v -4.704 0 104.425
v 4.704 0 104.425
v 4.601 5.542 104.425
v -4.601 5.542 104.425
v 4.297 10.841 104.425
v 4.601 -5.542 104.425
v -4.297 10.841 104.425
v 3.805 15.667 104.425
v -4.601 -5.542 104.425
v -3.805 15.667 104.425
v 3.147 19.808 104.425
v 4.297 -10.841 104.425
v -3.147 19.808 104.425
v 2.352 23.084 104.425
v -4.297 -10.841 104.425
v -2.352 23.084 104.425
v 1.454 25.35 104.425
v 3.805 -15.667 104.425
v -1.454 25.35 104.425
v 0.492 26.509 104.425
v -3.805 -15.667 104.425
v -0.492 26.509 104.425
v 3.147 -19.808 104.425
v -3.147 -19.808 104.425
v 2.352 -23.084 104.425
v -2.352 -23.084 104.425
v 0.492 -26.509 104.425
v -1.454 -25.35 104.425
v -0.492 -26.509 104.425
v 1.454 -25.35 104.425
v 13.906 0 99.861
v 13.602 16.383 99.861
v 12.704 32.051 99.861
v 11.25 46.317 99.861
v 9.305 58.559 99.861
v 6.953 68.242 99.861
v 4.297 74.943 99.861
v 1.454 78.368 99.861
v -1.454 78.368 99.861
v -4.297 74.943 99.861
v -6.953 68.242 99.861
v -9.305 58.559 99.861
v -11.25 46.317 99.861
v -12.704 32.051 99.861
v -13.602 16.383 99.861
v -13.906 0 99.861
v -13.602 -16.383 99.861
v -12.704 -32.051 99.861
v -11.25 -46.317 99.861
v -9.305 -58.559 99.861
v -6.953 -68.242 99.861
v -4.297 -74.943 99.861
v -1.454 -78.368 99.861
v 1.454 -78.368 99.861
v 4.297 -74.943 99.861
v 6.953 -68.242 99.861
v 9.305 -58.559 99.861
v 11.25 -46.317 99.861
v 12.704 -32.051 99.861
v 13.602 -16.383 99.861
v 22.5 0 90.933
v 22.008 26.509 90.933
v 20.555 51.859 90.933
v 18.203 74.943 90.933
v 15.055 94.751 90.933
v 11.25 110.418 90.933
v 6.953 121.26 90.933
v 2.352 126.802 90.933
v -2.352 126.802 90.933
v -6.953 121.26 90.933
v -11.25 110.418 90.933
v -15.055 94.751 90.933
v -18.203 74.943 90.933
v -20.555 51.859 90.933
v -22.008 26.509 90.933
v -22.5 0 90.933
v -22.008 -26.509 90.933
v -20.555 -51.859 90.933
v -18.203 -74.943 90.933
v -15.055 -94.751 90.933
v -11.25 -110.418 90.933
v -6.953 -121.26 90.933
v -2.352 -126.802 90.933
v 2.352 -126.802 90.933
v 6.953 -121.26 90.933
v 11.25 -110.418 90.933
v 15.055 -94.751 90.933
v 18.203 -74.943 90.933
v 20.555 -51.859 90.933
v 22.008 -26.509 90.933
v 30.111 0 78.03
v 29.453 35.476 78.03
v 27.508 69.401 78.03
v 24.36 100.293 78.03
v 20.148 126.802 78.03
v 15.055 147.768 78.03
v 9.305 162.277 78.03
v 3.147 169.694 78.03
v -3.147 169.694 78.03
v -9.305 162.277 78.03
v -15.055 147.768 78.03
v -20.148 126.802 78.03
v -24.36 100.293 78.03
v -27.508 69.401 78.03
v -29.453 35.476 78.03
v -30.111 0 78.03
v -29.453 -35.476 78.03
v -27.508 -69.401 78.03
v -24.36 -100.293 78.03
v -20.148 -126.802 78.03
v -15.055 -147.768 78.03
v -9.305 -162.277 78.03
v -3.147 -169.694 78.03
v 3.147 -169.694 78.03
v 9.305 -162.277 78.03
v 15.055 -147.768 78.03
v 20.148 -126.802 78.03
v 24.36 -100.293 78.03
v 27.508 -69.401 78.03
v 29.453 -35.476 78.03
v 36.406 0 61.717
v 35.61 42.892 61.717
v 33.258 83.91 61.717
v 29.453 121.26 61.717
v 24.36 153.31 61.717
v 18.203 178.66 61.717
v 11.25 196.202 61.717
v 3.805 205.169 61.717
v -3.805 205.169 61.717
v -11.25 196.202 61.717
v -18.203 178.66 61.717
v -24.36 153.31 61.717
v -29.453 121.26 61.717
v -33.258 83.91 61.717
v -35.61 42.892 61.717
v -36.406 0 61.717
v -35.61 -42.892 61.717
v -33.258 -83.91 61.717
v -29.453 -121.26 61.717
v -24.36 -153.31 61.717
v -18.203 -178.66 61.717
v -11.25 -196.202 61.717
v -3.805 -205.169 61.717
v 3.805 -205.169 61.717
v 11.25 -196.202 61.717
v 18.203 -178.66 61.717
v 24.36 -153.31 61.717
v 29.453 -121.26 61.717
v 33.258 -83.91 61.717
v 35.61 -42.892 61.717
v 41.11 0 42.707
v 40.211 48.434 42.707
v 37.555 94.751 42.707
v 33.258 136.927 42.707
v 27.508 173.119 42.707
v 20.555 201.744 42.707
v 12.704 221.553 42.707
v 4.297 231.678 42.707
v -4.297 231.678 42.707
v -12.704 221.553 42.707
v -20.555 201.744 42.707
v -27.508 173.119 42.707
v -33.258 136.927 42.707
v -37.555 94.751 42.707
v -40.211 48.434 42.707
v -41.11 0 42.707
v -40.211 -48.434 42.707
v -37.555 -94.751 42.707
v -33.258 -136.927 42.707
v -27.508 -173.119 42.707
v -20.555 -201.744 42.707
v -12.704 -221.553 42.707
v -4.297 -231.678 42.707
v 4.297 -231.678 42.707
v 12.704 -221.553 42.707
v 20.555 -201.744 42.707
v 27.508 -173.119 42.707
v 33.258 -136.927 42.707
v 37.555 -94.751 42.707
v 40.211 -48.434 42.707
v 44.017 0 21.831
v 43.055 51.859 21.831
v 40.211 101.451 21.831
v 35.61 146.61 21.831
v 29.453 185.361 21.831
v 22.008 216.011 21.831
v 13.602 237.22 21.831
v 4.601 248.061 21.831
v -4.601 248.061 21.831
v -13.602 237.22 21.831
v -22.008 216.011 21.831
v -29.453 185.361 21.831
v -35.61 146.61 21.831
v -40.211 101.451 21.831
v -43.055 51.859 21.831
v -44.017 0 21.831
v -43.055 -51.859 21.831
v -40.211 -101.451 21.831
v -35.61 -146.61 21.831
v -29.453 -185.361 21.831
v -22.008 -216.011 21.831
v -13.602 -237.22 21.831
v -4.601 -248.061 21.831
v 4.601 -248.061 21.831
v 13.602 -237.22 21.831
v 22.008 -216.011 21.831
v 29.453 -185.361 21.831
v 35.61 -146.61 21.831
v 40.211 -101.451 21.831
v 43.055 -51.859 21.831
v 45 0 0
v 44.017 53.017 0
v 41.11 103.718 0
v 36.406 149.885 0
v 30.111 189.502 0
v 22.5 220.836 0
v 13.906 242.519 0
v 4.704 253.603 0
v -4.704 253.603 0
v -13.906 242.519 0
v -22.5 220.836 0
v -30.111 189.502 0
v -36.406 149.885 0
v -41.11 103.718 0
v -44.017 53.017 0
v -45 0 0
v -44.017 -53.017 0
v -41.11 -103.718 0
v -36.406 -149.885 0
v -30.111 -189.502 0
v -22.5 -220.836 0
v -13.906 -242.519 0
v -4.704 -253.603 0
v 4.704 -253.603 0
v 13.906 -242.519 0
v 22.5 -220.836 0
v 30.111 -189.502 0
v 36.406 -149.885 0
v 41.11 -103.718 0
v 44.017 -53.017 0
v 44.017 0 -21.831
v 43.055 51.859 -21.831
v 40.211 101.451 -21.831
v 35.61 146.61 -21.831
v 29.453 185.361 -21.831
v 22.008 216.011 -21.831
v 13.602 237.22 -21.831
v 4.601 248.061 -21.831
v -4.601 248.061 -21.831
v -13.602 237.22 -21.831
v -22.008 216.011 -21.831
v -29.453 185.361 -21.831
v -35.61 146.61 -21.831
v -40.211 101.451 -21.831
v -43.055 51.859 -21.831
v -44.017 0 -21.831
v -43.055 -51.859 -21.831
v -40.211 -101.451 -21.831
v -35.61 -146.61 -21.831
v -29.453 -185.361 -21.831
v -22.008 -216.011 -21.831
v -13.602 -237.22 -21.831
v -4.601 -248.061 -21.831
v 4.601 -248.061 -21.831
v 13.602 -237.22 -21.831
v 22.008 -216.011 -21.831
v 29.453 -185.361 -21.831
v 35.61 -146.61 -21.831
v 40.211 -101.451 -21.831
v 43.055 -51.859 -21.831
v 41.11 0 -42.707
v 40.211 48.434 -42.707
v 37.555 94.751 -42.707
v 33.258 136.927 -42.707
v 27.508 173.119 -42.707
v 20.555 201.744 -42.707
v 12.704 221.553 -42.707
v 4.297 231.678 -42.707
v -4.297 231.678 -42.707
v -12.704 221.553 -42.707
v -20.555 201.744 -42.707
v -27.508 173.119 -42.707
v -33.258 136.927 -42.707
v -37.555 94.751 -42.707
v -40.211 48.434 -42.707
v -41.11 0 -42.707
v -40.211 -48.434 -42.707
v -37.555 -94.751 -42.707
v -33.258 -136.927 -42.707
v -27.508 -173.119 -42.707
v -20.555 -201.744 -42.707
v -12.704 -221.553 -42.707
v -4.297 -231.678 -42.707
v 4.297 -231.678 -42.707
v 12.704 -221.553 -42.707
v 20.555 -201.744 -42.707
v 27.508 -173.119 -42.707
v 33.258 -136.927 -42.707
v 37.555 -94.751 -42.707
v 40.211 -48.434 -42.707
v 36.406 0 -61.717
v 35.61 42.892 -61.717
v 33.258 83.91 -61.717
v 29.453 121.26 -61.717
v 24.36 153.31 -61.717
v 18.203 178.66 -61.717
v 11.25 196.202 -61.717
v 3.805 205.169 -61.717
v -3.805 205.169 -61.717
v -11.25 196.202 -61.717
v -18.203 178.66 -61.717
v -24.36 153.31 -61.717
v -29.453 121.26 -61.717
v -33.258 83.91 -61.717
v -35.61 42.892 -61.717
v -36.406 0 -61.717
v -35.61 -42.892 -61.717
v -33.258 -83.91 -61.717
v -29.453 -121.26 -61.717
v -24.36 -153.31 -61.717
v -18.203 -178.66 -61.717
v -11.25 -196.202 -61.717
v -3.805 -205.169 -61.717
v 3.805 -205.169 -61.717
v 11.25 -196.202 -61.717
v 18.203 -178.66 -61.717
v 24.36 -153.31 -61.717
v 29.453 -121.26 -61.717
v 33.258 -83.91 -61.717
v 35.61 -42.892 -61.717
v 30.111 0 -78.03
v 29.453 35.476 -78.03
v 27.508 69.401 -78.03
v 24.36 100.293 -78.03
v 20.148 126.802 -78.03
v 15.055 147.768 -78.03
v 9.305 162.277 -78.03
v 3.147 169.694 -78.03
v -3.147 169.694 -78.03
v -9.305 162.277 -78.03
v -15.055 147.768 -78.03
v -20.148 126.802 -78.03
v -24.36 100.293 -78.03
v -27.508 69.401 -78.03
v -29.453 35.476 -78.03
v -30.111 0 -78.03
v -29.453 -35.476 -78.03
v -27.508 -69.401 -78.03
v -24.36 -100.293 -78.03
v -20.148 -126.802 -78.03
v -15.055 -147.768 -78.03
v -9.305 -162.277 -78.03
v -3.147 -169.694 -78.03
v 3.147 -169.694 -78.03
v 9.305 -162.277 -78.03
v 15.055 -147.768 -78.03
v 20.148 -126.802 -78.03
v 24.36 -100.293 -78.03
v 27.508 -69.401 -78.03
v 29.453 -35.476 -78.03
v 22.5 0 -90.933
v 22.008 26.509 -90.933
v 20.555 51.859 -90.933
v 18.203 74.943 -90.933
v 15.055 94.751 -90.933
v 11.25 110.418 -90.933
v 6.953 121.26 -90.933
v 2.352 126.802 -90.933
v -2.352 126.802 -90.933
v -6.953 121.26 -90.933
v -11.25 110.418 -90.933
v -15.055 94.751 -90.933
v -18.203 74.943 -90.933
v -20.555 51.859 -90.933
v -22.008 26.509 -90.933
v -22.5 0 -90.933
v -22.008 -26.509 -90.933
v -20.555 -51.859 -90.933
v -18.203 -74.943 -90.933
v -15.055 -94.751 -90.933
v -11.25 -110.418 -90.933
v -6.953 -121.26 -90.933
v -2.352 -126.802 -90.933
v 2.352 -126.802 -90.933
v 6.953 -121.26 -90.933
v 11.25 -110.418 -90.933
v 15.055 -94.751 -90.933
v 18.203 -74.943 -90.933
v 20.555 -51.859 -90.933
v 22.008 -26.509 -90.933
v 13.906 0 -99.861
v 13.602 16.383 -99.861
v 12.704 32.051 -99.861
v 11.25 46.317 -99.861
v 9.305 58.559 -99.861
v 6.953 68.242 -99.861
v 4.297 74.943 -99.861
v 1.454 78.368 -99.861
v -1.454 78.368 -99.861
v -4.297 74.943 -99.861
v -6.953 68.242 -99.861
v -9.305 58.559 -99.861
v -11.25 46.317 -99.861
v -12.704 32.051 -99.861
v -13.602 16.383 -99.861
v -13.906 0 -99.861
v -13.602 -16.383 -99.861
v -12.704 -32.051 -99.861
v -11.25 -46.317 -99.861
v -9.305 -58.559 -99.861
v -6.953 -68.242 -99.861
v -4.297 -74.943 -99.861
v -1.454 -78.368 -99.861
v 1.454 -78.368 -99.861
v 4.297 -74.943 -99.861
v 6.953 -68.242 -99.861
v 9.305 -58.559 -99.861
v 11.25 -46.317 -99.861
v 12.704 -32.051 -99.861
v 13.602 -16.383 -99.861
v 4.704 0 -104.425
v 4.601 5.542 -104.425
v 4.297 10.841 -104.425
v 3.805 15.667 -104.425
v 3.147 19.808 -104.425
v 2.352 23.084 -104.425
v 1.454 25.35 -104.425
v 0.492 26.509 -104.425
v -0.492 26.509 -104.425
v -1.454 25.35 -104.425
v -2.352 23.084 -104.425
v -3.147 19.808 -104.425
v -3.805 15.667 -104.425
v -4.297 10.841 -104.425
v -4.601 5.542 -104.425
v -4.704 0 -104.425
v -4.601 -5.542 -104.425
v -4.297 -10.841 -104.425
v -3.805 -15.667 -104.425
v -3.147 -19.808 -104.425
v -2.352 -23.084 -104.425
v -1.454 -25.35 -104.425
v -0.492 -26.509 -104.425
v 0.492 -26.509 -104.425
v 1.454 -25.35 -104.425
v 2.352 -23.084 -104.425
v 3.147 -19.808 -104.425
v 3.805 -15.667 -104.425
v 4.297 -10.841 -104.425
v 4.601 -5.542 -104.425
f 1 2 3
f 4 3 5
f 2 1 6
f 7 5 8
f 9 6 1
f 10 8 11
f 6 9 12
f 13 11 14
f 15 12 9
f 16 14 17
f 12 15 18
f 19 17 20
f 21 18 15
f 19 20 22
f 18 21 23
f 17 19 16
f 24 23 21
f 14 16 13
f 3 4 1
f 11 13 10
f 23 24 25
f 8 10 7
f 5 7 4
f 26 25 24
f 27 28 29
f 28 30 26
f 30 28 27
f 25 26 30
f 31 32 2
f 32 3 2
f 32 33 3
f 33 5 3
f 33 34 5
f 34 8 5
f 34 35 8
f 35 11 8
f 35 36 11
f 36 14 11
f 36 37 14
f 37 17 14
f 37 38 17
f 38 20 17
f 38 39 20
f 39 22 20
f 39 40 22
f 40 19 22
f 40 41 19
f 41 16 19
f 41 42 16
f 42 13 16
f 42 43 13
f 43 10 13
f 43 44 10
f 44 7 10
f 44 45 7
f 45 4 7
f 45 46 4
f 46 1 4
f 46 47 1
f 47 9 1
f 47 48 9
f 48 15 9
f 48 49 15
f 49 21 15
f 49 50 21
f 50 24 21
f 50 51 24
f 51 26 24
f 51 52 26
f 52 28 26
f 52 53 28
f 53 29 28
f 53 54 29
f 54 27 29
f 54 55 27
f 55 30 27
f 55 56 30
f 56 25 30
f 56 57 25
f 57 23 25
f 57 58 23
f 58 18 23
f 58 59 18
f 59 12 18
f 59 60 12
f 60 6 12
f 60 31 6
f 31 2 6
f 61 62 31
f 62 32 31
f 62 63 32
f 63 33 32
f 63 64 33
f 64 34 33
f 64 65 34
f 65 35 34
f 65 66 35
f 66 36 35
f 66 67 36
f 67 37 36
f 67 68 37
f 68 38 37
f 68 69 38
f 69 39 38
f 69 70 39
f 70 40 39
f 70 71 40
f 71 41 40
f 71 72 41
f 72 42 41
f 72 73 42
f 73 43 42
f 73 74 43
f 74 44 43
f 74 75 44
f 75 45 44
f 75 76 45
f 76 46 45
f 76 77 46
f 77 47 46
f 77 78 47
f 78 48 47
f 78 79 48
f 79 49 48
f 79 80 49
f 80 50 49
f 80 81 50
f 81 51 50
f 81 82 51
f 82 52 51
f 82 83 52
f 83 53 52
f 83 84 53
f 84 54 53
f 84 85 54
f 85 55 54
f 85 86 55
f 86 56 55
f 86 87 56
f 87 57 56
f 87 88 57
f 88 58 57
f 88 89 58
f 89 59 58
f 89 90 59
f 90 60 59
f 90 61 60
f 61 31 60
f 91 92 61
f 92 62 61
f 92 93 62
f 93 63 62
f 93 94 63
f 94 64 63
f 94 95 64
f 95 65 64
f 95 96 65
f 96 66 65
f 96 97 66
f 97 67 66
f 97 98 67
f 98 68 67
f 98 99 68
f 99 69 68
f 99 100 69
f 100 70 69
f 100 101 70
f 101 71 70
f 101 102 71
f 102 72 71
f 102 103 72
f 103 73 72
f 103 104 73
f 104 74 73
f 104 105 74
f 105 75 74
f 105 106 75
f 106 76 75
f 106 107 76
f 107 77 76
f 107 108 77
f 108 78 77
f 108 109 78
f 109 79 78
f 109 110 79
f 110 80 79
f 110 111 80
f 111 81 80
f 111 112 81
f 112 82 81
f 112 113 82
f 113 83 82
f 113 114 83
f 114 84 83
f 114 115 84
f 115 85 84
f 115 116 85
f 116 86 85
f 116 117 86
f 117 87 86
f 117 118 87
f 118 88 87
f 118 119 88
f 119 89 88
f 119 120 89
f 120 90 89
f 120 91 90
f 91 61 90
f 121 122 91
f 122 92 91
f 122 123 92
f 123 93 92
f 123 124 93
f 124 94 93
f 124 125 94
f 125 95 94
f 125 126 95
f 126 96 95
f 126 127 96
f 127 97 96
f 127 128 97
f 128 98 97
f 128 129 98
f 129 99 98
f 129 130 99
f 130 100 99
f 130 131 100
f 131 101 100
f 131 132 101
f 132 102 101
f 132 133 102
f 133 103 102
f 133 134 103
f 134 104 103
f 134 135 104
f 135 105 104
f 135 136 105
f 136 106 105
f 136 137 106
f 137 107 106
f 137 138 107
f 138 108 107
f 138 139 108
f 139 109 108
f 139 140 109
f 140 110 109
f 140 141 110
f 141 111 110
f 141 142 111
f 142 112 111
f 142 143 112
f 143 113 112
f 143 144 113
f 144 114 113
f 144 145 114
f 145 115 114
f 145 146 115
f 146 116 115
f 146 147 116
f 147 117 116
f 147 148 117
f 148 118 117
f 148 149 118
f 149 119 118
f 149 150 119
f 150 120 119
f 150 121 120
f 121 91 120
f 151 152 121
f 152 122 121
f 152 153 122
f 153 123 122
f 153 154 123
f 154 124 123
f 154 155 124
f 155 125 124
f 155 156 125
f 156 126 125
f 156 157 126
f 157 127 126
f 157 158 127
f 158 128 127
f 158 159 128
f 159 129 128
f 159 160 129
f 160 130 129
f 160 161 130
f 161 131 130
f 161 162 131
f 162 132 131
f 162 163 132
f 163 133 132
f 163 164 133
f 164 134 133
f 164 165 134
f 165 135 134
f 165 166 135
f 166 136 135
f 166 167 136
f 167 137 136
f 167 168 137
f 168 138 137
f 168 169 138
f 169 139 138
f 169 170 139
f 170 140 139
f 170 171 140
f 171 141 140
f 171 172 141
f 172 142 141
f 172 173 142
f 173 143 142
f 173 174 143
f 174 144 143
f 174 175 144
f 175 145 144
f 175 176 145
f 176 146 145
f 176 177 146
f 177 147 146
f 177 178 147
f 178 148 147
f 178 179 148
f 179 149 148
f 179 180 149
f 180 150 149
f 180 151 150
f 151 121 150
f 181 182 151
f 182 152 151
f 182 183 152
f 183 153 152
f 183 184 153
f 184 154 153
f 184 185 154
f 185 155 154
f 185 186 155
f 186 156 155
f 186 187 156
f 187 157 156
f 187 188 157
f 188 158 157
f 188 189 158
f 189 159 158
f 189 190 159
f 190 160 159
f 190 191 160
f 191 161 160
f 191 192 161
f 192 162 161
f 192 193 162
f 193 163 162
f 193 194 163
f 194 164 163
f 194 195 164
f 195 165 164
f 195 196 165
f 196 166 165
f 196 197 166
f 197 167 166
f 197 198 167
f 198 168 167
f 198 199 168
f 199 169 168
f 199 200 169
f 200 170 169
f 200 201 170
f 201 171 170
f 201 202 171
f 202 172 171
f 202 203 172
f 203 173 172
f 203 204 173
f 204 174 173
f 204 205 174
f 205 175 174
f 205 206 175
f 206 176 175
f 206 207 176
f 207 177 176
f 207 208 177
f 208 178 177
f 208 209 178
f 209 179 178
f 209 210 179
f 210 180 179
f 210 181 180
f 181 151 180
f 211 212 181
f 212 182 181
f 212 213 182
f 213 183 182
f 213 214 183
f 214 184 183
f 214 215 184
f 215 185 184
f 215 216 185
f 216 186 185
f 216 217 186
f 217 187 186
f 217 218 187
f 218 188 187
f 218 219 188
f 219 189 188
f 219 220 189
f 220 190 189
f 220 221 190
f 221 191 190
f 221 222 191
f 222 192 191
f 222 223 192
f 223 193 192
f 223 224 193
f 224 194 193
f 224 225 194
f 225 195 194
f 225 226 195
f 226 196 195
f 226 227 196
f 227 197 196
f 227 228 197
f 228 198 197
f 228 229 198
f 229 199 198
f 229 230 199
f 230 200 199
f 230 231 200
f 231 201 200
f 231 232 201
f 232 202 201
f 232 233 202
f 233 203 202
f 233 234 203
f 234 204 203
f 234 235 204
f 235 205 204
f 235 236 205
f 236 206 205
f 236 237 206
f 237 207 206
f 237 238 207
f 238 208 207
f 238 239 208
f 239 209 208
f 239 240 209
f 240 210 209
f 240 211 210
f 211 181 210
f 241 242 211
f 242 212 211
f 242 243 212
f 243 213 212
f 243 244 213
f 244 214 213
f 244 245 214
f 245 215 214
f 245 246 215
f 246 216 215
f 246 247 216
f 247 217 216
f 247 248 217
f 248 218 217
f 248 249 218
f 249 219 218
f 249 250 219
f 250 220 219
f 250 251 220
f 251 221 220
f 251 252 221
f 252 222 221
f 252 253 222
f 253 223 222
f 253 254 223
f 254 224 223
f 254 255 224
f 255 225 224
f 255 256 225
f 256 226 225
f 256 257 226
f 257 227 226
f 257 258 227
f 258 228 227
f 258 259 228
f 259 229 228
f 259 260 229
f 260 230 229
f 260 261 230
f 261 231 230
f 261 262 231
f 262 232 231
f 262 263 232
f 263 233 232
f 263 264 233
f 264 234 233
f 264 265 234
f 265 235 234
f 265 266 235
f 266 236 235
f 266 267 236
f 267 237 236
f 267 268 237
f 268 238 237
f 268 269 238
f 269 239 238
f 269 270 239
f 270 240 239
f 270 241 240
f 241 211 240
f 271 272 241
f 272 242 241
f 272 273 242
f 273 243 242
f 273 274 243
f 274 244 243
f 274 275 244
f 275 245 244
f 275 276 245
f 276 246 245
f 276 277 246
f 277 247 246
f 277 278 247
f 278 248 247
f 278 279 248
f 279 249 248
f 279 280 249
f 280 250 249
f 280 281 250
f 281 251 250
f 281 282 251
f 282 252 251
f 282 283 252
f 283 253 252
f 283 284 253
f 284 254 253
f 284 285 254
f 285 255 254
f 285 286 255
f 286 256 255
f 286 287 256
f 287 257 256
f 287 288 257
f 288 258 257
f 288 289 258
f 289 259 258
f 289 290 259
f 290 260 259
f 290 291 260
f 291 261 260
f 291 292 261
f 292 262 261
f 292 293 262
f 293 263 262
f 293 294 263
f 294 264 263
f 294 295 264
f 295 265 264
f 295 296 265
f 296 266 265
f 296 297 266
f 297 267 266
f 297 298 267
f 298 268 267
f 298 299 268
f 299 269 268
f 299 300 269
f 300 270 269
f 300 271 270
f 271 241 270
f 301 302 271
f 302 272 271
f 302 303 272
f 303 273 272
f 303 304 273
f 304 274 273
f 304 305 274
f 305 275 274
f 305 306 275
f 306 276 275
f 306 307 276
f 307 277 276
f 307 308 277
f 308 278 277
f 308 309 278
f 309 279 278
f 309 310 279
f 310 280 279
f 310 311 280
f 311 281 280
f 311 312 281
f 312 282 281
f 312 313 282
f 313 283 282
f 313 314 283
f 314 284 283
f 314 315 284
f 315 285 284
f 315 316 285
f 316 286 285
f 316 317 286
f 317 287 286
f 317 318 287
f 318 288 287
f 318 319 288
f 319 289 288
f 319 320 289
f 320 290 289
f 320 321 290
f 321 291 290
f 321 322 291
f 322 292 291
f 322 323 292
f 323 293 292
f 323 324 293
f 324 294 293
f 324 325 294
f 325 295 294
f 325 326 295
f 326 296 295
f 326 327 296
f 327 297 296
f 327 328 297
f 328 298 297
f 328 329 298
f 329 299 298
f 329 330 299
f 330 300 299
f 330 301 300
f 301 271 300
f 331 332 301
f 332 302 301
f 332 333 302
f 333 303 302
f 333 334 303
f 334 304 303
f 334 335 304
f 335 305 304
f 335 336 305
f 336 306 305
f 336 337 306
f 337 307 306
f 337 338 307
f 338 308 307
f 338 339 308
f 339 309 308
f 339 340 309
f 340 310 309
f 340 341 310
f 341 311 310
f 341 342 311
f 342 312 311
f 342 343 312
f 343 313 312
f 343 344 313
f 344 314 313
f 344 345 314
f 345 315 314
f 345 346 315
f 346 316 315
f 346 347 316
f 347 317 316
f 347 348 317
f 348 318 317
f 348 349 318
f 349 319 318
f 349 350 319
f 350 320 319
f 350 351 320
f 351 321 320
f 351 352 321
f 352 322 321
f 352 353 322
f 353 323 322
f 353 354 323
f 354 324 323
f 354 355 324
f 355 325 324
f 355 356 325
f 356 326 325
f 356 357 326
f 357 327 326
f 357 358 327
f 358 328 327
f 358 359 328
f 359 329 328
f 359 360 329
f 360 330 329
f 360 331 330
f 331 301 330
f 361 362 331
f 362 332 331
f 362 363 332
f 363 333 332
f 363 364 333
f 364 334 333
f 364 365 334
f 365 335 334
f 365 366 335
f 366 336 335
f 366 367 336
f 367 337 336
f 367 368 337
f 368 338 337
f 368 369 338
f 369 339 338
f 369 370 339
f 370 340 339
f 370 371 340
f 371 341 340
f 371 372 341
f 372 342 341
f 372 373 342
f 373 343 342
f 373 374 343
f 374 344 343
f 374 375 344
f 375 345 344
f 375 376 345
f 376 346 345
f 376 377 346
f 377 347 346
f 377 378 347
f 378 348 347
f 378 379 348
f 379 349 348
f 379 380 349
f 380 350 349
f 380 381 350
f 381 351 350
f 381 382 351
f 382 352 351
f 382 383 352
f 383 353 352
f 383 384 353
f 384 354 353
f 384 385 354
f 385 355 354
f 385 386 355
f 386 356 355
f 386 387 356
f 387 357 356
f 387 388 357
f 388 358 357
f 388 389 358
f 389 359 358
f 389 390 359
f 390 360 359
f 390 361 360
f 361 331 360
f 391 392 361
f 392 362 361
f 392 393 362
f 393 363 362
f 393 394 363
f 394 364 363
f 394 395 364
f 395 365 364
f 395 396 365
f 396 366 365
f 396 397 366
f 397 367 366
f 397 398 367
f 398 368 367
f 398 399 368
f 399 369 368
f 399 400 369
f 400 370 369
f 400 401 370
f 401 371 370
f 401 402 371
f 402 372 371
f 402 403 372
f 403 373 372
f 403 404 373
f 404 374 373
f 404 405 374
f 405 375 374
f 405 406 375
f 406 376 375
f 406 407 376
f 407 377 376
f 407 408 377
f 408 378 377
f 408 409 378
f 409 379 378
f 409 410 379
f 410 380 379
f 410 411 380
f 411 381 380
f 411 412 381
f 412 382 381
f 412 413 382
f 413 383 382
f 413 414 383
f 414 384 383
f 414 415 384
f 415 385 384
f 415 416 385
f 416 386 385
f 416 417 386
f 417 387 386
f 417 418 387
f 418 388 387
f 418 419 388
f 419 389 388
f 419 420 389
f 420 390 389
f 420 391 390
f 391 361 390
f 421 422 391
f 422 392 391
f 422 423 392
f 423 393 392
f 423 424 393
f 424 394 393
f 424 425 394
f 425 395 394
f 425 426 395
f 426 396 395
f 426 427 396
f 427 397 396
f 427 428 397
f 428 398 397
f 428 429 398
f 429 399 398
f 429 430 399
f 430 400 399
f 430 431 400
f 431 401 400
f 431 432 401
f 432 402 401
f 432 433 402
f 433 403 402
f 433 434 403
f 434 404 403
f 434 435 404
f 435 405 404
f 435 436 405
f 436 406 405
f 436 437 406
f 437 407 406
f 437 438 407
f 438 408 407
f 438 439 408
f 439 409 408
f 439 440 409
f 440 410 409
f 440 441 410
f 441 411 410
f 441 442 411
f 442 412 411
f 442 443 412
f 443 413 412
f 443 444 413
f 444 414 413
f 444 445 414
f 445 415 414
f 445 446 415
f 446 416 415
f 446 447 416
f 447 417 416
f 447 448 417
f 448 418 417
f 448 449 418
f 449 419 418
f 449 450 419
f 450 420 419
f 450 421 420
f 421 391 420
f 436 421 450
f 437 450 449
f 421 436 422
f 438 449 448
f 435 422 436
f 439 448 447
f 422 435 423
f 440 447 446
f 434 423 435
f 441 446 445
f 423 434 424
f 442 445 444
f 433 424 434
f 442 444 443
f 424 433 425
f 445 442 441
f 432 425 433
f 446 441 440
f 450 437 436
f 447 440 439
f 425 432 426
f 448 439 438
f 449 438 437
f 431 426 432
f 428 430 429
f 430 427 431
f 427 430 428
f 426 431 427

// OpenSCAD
// Generated by SolidPython 1.0.1 on 2020-07-29 00:46:45


scale(v = [3, 17, 7]) {
	sphere(r = 15);
}
/***********************************************
*********      SolidPython code:      **********
************************************************
 
# import packages: SolidPython
from solid import *
from solid.utils import *
from itertools import chain, combinations, permutations


class Resize:

    def __init__(self, scad_file):
        self.scad_file = scad_file
        #self.scad_file = import_scad(scad_file)
        # cone/cylinder param:
        self.r1 = 0
        self.r2 = 0
        self.h = 0
        # rectangular prism param:
        self.w = 0
        self.l = 0
        # ellipse param:
        self.r = 0

    # import OpenScad code (file name corresponds to shape)


    # classify shape + parameters
    def assign(self, param1, param2, param3):
        if self.scad_file == 'cone.scad':
            self.r1 = param1
            self.r2 = param2
            self.h = param3
        elif self.scad_file == 'cylinder.scad':
            self.r1 = param1
            self.r2 = param2
            self.h = param3
        elif self.scad_file == 'rectangularPrism.scad':
            self.h = param1
            self.l = param2
            self.w = param3
        else:
            self.r = param1
            self.h = param2

    # resize parameters
    def iterate(self):
        x = range(3, 20, 2)
        i = 1
        if self.scad_file == 'cone.scad':
            tempList = list(permutations(x, 2))
            for temp in tempList:
                param1 = temp[0]
                param2 = temp[1]
                filepath = 'produced_scad_files/' + 'cone' + str(param1) + '_' + str(param2) + '_' + '.scad'
                scad_render_to_file(cylinder(h=param1, r1=param2, r2=0), filepath)

        elif self.scad_file == 'cylinder.scad':
            tempList = list(permutations(x, 3))
            for temp in tempList:
                param1 = temp[0]
                param2 = temp[1]
                filepath = 'produced_scad_files/' + 'cylinder' + str(param1) + '_' + str(param2) + '_' + '.scad'
                scad_render_to_file(cylinder(h=param1, r1=param2, r2=param2), filepath)

        elif self.scad_file == 'rectangularPrism.scad':
            tempList = list(permutations(x, 3))
            for temp in tempList:
                param1 = temp[0]
                param2 = temp[1]
                param3 = temp[2]
                filepath = 'produced_scad_files/' + 'rectangularPrism' + str(param1) + '_' + str(param2) + '_' + str(
                    param3) + '.scad'
                scad_render_to_file(cube(size=(param1, param2, param3)), filepath)

        elif self.scad_file == 'ellipse.scad':
            tempList = list(permutations(x, 4))
            for temp in tempList:
                param1 = temp[0]
                param2 = temp[1]
                param3 = temp[2]
                param4 = temp[3]
                filepath = 'produced_scad_files/' + 'ellipse' + str(param1) + '_' + str(param2) + '_' + str(param3) + '_' + str(param4) + '.scad'
                scad_render_to_file(scale([param1, param2, param3])(sphere(r=param4)), filepath)

    def render_to_scadfile(self):
        scad_render_to_file(scad, 'example.scad') 
 
************************************************/
